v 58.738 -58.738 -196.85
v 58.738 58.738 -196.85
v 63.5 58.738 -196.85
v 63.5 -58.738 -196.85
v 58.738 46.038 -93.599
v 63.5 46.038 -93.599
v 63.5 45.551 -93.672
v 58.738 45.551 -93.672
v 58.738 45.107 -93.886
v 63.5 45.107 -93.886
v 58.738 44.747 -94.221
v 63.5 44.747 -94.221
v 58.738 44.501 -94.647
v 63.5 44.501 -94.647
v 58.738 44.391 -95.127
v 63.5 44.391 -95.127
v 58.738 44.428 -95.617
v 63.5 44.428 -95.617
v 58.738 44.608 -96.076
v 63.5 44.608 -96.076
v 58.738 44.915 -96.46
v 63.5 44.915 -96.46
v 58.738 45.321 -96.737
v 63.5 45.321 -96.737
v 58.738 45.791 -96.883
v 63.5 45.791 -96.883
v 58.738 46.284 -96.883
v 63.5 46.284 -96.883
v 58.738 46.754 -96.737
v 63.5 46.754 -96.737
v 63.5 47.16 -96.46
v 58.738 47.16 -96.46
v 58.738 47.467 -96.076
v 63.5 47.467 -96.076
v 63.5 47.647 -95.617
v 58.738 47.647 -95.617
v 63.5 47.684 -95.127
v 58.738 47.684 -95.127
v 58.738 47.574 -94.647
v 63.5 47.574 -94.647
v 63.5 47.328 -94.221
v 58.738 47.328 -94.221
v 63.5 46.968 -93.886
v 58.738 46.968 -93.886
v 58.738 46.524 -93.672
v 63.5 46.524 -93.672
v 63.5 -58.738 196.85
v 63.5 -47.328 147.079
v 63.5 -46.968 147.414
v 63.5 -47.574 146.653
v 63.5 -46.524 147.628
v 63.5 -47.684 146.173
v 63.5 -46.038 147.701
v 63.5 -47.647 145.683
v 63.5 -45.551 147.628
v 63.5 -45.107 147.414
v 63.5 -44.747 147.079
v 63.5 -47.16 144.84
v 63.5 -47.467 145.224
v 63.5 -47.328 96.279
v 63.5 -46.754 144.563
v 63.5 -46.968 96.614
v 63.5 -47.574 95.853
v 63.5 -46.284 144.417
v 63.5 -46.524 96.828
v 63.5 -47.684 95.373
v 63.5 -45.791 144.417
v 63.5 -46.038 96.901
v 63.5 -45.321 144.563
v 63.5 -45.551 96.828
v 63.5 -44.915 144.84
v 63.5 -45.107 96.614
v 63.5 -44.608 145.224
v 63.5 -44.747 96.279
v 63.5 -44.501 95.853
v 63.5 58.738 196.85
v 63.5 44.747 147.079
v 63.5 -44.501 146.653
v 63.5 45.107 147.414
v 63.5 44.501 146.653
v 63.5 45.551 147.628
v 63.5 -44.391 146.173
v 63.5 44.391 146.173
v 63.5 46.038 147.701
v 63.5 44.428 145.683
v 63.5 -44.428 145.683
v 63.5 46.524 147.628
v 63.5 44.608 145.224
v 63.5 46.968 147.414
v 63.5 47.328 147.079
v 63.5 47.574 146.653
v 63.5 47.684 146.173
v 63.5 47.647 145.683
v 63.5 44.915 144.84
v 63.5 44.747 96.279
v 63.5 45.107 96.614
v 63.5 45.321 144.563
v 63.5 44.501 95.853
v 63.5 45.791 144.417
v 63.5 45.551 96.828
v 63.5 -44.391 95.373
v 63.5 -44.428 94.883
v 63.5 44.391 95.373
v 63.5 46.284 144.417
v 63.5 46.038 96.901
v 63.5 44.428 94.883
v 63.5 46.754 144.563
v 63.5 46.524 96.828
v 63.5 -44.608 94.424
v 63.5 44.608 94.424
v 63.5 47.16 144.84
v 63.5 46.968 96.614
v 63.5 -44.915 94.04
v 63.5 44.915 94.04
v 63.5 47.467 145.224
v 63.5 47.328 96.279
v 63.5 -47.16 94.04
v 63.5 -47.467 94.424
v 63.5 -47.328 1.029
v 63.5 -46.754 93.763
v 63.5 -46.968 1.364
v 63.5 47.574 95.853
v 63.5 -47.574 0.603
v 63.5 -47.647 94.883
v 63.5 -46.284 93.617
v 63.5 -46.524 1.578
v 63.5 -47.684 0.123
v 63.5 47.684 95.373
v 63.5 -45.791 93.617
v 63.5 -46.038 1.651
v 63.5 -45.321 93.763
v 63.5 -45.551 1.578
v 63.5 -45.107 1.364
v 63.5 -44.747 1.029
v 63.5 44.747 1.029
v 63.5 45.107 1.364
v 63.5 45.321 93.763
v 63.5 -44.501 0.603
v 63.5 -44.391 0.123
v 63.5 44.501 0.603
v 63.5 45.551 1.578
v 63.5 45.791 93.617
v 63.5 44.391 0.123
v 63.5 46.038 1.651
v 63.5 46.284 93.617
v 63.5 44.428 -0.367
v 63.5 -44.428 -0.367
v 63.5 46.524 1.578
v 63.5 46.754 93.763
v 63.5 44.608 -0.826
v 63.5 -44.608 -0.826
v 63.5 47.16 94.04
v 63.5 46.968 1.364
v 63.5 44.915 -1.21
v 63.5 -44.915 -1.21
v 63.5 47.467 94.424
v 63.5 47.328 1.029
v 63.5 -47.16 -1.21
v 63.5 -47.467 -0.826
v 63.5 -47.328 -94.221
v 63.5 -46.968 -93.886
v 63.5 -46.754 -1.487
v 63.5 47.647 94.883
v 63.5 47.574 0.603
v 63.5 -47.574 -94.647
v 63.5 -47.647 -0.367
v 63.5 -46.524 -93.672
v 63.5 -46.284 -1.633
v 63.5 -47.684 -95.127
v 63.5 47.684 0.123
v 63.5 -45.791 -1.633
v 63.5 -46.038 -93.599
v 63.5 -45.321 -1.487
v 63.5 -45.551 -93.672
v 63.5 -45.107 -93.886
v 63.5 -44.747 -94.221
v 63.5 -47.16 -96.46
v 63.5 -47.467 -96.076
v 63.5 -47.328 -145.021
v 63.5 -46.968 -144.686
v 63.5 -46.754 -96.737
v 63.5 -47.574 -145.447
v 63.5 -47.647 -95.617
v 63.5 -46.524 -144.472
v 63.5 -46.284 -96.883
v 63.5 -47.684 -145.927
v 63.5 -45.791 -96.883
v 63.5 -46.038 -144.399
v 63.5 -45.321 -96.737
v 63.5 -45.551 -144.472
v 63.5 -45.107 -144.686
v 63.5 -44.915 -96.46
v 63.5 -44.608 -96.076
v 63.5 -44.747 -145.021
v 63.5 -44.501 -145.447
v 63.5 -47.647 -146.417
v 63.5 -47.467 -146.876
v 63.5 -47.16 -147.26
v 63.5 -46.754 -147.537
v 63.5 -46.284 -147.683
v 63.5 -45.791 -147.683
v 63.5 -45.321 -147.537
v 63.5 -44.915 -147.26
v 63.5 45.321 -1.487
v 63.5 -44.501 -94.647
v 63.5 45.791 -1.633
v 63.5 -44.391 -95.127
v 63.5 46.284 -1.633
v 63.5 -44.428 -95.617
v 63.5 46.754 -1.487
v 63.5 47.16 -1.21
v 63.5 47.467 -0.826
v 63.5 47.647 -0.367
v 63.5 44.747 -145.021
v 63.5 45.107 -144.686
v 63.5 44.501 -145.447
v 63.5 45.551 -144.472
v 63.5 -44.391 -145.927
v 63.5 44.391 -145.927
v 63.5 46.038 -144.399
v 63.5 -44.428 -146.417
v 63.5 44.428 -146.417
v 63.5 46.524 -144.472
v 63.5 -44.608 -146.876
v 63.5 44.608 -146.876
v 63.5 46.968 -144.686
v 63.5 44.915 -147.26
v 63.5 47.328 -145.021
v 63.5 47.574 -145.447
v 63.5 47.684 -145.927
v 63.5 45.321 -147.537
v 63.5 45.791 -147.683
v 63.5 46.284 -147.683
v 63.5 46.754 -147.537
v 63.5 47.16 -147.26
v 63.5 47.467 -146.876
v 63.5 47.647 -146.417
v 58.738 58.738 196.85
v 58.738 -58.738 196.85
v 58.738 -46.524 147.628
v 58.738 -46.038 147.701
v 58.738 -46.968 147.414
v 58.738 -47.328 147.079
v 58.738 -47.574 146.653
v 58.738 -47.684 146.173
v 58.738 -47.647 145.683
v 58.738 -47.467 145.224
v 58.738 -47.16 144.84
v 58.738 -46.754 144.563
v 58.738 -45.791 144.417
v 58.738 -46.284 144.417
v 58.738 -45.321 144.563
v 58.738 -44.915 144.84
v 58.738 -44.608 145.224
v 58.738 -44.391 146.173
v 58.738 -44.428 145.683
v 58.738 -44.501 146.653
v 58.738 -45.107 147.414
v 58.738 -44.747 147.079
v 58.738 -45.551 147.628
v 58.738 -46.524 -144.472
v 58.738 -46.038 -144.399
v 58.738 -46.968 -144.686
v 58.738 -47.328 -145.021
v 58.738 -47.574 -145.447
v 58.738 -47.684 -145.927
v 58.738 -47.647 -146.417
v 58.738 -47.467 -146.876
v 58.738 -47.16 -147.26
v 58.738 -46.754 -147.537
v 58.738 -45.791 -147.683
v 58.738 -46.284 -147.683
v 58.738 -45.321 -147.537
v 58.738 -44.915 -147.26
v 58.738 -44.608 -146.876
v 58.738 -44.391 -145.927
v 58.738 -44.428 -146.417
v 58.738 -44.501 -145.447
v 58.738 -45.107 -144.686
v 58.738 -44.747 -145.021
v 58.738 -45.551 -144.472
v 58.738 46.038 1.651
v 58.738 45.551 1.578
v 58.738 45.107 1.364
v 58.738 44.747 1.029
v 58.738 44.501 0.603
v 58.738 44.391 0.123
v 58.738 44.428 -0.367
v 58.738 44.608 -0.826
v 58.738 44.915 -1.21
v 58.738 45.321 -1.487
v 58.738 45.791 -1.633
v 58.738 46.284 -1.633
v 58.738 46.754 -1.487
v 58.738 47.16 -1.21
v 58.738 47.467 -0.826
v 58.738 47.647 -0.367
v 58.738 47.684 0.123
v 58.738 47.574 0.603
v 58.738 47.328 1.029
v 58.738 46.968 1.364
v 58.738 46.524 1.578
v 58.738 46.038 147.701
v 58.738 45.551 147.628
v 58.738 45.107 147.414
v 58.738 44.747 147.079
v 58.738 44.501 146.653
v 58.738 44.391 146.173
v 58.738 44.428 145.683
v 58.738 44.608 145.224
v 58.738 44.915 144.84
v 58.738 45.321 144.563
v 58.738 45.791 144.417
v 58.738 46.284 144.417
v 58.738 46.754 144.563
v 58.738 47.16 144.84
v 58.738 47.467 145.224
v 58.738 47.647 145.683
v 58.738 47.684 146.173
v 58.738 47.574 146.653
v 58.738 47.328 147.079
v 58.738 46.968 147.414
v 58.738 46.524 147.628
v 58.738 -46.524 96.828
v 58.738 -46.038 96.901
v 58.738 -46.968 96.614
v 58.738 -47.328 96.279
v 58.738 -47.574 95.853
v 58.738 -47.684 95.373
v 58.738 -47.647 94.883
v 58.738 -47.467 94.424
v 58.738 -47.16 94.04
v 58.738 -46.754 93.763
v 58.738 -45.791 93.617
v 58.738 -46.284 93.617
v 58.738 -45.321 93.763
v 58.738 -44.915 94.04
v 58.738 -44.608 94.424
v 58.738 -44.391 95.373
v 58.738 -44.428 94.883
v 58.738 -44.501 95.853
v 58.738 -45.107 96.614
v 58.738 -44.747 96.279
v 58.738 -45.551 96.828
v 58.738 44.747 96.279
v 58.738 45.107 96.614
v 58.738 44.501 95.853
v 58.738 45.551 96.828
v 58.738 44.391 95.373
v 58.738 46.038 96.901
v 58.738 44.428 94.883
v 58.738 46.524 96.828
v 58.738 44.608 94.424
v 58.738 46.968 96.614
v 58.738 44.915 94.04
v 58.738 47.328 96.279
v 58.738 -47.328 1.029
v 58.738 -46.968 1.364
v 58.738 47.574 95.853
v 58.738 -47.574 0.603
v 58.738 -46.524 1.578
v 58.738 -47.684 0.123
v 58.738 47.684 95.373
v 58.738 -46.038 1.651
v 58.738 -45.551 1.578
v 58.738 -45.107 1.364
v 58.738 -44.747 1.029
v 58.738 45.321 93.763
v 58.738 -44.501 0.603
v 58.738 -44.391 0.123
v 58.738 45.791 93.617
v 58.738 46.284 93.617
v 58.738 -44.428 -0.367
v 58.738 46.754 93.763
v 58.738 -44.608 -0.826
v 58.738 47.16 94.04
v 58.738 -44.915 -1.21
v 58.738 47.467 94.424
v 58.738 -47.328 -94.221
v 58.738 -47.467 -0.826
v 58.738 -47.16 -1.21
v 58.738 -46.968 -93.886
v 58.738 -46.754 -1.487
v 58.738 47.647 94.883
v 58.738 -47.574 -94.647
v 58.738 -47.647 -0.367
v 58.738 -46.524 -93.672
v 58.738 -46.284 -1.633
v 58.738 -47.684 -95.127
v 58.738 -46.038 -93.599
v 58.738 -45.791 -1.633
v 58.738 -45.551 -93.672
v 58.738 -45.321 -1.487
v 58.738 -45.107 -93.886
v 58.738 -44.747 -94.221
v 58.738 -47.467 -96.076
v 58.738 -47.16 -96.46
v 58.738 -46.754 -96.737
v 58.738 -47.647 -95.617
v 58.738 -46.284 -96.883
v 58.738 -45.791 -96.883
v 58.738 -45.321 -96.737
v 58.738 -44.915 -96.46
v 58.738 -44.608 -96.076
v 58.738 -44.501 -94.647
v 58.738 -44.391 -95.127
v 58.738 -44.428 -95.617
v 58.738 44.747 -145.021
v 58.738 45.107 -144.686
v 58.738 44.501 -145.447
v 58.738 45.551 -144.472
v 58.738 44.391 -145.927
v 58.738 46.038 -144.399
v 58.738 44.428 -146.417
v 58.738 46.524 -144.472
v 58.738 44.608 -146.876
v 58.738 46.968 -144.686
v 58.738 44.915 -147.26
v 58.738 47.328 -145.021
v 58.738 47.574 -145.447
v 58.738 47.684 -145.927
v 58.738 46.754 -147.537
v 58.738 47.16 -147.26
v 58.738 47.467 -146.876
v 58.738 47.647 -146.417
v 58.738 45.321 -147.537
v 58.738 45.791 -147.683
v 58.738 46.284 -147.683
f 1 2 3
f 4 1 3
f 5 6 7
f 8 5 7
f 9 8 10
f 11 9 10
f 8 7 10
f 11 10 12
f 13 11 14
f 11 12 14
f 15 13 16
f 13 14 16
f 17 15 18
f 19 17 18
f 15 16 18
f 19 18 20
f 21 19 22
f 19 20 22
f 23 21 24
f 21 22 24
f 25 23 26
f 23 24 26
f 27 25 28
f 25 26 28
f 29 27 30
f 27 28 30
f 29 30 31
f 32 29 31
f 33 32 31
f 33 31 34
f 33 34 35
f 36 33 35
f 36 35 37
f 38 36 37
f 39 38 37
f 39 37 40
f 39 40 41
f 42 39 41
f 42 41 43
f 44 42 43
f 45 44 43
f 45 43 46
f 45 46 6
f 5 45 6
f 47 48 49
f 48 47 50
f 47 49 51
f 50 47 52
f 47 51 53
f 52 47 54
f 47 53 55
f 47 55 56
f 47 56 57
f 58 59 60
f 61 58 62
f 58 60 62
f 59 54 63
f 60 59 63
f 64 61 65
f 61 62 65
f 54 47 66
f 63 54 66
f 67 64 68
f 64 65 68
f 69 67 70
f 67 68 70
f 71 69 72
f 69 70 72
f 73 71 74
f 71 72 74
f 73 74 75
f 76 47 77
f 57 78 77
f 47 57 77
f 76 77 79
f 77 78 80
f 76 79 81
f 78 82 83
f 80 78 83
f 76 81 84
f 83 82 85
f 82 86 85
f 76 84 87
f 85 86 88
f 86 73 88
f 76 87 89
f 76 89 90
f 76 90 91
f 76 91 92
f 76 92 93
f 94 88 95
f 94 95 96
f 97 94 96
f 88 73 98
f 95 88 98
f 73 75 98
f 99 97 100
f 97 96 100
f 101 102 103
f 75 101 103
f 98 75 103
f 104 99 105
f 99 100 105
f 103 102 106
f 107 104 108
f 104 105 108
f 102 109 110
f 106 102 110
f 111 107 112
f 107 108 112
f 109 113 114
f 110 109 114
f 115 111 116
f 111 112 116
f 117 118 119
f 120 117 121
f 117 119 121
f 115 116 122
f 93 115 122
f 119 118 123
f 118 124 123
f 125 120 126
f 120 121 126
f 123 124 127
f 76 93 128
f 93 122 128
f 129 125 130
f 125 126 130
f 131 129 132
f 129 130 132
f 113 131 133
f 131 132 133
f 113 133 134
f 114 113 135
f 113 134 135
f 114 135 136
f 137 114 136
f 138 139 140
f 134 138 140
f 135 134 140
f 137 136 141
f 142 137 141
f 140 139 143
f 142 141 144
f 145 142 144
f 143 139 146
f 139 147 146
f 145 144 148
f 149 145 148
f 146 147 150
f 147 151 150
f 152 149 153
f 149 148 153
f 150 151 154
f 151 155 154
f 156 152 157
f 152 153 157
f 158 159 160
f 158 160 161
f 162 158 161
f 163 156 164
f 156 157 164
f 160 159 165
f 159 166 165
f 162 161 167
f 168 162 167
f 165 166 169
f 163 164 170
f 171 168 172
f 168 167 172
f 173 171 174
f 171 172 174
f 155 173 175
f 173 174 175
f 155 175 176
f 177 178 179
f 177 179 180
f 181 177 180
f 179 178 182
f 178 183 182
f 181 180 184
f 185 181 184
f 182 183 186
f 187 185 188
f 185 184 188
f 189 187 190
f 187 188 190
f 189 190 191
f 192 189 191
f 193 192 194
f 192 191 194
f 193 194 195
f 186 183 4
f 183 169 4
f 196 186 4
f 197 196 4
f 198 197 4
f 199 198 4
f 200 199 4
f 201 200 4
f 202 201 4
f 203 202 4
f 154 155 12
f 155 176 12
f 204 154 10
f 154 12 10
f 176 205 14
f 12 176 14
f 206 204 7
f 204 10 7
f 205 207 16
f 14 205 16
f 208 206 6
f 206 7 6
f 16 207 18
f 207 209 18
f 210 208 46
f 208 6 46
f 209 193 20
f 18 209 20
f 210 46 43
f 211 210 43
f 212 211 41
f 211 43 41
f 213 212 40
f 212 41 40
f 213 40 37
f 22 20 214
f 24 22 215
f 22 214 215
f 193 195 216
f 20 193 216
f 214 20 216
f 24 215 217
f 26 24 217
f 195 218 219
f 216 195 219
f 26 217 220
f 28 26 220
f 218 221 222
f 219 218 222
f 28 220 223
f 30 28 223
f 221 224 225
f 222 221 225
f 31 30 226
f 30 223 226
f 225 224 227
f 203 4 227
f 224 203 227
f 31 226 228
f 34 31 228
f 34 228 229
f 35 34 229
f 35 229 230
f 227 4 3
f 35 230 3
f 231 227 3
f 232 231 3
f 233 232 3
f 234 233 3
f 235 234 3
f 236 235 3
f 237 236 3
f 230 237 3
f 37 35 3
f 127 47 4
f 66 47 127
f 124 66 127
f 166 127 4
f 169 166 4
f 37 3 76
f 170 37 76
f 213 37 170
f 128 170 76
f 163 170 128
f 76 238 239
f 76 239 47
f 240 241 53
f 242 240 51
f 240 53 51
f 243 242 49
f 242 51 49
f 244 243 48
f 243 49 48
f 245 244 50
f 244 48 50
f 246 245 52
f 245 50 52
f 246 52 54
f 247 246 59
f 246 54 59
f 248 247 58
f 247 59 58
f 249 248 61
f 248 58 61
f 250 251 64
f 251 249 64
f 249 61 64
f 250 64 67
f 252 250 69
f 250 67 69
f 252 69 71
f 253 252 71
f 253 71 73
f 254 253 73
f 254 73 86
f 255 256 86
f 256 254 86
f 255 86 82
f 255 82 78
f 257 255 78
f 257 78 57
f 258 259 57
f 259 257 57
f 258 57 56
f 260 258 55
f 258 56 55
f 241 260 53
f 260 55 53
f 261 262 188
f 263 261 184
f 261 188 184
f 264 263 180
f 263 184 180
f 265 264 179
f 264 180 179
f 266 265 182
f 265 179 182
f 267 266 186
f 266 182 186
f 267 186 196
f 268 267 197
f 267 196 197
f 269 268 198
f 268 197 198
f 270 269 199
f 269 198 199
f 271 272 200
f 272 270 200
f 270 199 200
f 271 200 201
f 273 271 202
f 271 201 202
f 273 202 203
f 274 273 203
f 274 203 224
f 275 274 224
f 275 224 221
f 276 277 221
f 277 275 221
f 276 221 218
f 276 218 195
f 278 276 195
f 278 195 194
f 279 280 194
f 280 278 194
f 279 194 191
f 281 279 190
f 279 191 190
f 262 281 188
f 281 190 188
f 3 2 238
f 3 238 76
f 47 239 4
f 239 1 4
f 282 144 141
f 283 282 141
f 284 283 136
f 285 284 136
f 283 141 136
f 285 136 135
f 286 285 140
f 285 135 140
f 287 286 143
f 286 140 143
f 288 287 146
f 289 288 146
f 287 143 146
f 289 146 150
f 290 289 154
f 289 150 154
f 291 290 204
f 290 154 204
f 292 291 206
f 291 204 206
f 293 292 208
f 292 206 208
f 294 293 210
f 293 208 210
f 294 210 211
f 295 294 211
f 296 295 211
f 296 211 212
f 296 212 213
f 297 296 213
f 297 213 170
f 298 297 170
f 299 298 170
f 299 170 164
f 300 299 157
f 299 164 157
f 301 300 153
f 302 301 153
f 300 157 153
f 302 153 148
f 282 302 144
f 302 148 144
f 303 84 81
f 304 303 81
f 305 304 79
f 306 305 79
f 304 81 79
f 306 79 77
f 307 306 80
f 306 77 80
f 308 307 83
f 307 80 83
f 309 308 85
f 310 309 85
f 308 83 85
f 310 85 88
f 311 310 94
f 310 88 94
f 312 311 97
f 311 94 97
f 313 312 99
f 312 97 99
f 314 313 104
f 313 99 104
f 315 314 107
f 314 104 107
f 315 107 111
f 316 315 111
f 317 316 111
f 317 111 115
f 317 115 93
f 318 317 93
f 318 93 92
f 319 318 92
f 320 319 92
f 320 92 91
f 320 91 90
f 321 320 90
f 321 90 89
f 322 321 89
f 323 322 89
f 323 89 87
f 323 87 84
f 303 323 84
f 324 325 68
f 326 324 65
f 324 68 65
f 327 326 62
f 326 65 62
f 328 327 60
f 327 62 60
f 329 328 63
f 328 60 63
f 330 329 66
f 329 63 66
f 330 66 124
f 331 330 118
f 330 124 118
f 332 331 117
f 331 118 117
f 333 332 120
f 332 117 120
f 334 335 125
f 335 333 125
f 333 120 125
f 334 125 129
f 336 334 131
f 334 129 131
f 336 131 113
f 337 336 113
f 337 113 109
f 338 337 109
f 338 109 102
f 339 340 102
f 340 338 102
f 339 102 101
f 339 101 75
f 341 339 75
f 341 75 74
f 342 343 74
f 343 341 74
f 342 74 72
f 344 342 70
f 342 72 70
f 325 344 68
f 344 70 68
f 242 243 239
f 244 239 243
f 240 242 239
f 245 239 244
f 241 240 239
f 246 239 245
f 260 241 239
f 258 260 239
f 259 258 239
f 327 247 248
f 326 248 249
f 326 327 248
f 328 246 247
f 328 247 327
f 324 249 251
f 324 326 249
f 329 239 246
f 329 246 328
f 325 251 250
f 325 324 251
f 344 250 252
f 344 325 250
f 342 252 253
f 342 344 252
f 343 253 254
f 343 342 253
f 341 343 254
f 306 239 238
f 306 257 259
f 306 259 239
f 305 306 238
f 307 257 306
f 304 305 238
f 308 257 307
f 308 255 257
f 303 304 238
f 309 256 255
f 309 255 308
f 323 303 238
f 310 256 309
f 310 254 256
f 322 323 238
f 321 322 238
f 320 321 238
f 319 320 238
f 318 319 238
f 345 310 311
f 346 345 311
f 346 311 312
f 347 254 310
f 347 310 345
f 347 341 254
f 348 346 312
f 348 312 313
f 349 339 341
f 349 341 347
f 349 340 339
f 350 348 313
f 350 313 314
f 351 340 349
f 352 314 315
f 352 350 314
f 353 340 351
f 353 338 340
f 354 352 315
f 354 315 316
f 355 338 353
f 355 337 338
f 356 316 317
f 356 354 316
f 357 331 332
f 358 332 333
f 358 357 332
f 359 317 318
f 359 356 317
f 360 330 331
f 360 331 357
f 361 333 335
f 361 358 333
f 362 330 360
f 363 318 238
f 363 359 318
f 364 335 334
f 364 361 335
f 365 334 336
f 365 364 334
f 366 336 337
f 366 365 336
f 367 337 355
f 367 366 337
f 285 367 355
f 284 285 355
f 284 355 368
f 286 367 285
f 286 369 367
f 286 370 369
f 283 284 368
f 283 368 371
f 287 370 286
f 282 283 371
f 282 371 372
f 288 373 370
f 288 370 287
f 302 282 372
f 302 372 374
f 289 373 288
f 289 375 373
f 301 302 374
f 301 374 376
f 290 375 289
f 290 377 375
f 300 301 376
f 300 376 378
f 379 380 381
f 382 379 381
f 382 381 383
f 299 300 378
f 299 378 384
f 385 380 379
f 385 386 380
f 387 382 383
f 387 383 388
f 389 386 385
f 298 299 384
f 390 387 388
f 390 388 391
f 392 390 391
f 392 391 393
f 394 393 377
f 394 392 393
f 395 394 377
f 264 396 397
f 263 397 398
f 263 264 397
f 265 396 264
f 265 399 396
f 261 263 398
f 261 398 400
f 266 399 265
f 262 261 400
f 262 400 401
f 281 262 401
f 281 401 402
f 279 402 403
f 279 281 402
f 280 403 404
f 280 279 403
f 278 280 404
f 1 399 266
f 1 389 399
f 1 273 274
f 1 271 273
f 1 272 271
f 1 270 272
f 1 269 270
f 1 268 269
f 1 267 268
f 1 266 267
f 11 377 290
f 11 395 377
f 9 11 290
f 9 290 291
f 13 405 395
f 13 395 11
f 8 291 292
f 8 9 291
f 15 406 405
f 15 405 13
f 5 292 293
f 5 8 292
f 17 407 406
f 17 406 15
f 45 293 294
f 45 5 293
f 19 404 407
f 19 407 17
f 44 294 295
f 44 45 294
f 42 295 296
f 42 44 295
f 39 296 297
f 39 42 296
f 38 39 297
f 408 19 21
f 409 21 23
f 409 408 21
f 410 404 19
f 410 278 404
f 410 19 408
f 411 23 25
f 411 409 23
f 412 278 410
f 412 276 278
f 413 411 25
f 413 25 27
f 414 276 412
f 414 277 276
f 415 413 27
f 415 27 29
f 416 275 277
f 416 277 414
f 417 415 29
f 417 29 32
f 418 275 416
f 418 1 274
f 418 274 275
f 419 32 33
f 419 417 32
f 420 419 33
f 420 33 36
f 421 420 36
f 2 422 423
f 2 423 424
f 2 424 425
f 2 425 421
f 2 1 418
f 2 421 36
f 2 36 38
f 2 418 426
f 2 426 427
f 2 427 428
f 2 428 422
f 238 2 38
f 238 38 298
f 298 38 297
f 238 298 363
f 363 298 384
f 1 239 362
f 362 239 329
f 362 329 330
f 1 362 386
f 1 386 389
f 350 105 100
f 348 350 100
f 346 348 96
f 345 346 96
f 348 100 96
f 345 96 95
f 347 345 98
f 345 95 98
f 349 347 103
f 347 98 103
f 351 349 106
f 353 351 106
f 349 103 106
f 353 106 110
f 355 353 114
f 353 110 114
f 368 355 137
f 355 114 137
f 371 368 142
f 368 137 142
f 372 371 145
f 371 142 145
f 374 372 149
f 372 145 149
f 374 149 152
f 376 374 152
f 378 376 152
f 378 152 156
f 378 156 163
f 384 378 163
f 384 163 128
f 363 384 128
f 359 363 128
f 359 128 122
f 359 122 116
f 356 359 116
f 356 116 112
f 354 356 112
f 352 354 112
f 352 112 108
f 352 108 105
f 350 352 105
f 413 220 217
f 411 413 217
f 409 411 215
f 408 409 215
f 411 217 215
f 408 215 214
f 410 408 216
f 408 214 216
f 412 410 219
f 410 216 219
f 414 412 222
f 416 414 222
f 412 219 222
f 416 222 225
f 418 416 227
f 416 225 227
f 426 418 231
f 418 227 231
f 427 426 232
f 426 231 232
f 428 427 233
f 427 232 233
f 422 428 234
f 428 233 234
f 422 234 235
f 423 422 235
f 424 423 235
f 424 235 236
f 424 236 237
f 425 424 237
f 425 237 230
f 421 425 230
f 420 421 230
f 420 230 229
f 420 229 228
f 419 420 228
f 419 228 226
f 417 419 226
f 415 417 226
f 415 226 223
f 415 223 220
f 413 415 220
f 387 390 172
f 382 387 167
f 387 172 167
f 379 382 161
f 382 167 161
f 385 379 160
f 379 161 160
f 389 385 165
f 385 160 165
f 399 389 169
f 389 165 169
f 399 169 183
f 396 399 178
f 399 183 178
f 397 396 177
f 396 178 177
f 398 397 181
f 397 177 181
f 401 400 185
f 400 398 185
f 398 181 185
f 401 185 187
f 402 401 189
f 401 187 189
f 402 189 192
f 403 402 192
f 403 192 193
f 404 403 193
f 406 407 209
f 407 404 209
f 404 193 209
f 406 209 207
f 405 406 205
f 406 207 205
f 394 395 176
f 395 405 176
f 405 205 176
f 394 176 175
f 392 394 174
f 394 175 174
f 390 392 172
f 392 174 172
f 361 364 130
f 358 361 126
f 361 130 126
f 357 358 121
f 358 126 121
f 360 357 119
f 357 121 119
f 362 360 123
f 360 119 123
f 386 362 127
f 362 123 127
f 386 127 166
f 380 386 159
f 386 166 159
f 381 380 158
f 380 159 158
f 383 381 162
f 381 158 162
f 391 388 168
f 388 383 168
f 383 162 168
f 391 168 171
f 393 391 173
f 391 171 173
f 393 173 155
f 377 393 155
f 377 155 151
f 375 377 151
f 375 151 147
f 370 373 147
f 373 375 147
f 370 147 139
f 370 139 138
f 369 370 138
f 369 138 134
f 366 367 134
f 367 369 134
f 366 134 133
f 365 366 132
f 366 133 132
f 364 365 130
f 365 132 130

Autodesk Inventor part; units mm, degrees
ref_plane "YZ Plane" through (0, 0, 0) normal (1, 0, 0) x (0, 1, 0)
ref_plane "XZ Plane" through (0, 0, 0) normal (0, 1, 0) x (-1, 0, 0)
ref_plane "XY Plane" through (0, 0, 0) normal (0, 0, 1) x (1, 0, 0)
sketch "Sketch3" plane through (0, 0, 0) normal (0, 0, 1) x (1, 0, 0)
  line L0 (-58.7375, -58.7375) -> (58.7375, -58.7375)
  line L1 (58.7375, -58.7375) -> (58.7375, 58.7375)
  line L2 (58.7375, 58.7375) -> (-58.7375, 58.7375)
  line L3 (-58.7375, 58.7375) -> (-58.7375, -58.7375)
  line L4 (-58.7375, -58.7375) -> (58.7375, 58.7375) construction
  line L5 (58.7375, -58.7375) -> (-58.7375, 58.7375) construction
  line L6 (63.5, -58.7375) -> (63.5, 58.7375)
  line L7 (-63.5, 58.7375) -> (-63.5, -58.7375)
  line L8 (-58.7375, 58.7375) -> (-63.5, 58.7375)
  line L9 (58.7375, 58.7375) -> (63.5, 58.7375)
  line L10 (58.7375, -58.7375) -> (63.5, -58.7375)
  line L11 (-58.7375, -58.7375) -> (-63.5, -58.7375)
  point P0 (0, 0)
  dimension "d28" = 117.475
  dimension "d29" = 117.475
  dimension "d30" = 4.7625
  dimension "d40" = 4.7625
extrude "Extrusion3" add sketch "Sketch3" along normal mid plane 393.7 contours L1 L9 L6 L10
sketch "Sketch7" plane through (58.7375, -58.7375, 196.85) normal (-1, 0, 0) x (0, 0, 1)
  line L0 (-393.7, 0) -> (0, 0) projected
  line L1 (0, 117.475) -> (0, 0) projected
  line L2 (0, 117.475) -> (-393.7, 117.475) projected
  line L3 (-393.7, 0) -> (-393.7, 117.475) projected
  line L4 (-393.7, 117.475) -> (-393.7, 0) projected
  line L5 (-393.7, 104.775) -> (0, 104.775)
  point P0 (-196.85, 58.7375)
  point P1 (-342.9, 104.775)
  point P2 (-196.85, 104.775)
  point P3 (-292.1, 104.775)
  point P4 (-50.8, 104.775)
  point P5 (-101.6, 104.775)
  dimension "d47" = 12.7
  dimension "d48" = 50.8
  dimension "d49" = 50.8
  dimension "d50" = 50.8
  dimension "d51" = 50.8
hole "Hole2" at (58.7375, 46.0375, -146.05) at (58.7375, 46.0375, 0) at (58.7375, 46.0375, -95.25) at (58.7375, 46.0375, 146.05) at (58.7375, 46.0375, 95.25) direction (1, 0, 0) diameter 3.302 depth 12.446 tip angle 118 thread size "8-32 UNC" class "2B" standard "ANSI Unified Screw Threads"
mirror "Mirror7" about plane through (0, 0, 0) normal (0, 1, 0) of "Hole2"
equation "\"d40\" = d30"
equation "\"d49\" = d48"
equation "\"d50\" = d48"
equation "\"d51\" = d50"
properties part number "1212_Flat Connector_V1" material "GFRP"
